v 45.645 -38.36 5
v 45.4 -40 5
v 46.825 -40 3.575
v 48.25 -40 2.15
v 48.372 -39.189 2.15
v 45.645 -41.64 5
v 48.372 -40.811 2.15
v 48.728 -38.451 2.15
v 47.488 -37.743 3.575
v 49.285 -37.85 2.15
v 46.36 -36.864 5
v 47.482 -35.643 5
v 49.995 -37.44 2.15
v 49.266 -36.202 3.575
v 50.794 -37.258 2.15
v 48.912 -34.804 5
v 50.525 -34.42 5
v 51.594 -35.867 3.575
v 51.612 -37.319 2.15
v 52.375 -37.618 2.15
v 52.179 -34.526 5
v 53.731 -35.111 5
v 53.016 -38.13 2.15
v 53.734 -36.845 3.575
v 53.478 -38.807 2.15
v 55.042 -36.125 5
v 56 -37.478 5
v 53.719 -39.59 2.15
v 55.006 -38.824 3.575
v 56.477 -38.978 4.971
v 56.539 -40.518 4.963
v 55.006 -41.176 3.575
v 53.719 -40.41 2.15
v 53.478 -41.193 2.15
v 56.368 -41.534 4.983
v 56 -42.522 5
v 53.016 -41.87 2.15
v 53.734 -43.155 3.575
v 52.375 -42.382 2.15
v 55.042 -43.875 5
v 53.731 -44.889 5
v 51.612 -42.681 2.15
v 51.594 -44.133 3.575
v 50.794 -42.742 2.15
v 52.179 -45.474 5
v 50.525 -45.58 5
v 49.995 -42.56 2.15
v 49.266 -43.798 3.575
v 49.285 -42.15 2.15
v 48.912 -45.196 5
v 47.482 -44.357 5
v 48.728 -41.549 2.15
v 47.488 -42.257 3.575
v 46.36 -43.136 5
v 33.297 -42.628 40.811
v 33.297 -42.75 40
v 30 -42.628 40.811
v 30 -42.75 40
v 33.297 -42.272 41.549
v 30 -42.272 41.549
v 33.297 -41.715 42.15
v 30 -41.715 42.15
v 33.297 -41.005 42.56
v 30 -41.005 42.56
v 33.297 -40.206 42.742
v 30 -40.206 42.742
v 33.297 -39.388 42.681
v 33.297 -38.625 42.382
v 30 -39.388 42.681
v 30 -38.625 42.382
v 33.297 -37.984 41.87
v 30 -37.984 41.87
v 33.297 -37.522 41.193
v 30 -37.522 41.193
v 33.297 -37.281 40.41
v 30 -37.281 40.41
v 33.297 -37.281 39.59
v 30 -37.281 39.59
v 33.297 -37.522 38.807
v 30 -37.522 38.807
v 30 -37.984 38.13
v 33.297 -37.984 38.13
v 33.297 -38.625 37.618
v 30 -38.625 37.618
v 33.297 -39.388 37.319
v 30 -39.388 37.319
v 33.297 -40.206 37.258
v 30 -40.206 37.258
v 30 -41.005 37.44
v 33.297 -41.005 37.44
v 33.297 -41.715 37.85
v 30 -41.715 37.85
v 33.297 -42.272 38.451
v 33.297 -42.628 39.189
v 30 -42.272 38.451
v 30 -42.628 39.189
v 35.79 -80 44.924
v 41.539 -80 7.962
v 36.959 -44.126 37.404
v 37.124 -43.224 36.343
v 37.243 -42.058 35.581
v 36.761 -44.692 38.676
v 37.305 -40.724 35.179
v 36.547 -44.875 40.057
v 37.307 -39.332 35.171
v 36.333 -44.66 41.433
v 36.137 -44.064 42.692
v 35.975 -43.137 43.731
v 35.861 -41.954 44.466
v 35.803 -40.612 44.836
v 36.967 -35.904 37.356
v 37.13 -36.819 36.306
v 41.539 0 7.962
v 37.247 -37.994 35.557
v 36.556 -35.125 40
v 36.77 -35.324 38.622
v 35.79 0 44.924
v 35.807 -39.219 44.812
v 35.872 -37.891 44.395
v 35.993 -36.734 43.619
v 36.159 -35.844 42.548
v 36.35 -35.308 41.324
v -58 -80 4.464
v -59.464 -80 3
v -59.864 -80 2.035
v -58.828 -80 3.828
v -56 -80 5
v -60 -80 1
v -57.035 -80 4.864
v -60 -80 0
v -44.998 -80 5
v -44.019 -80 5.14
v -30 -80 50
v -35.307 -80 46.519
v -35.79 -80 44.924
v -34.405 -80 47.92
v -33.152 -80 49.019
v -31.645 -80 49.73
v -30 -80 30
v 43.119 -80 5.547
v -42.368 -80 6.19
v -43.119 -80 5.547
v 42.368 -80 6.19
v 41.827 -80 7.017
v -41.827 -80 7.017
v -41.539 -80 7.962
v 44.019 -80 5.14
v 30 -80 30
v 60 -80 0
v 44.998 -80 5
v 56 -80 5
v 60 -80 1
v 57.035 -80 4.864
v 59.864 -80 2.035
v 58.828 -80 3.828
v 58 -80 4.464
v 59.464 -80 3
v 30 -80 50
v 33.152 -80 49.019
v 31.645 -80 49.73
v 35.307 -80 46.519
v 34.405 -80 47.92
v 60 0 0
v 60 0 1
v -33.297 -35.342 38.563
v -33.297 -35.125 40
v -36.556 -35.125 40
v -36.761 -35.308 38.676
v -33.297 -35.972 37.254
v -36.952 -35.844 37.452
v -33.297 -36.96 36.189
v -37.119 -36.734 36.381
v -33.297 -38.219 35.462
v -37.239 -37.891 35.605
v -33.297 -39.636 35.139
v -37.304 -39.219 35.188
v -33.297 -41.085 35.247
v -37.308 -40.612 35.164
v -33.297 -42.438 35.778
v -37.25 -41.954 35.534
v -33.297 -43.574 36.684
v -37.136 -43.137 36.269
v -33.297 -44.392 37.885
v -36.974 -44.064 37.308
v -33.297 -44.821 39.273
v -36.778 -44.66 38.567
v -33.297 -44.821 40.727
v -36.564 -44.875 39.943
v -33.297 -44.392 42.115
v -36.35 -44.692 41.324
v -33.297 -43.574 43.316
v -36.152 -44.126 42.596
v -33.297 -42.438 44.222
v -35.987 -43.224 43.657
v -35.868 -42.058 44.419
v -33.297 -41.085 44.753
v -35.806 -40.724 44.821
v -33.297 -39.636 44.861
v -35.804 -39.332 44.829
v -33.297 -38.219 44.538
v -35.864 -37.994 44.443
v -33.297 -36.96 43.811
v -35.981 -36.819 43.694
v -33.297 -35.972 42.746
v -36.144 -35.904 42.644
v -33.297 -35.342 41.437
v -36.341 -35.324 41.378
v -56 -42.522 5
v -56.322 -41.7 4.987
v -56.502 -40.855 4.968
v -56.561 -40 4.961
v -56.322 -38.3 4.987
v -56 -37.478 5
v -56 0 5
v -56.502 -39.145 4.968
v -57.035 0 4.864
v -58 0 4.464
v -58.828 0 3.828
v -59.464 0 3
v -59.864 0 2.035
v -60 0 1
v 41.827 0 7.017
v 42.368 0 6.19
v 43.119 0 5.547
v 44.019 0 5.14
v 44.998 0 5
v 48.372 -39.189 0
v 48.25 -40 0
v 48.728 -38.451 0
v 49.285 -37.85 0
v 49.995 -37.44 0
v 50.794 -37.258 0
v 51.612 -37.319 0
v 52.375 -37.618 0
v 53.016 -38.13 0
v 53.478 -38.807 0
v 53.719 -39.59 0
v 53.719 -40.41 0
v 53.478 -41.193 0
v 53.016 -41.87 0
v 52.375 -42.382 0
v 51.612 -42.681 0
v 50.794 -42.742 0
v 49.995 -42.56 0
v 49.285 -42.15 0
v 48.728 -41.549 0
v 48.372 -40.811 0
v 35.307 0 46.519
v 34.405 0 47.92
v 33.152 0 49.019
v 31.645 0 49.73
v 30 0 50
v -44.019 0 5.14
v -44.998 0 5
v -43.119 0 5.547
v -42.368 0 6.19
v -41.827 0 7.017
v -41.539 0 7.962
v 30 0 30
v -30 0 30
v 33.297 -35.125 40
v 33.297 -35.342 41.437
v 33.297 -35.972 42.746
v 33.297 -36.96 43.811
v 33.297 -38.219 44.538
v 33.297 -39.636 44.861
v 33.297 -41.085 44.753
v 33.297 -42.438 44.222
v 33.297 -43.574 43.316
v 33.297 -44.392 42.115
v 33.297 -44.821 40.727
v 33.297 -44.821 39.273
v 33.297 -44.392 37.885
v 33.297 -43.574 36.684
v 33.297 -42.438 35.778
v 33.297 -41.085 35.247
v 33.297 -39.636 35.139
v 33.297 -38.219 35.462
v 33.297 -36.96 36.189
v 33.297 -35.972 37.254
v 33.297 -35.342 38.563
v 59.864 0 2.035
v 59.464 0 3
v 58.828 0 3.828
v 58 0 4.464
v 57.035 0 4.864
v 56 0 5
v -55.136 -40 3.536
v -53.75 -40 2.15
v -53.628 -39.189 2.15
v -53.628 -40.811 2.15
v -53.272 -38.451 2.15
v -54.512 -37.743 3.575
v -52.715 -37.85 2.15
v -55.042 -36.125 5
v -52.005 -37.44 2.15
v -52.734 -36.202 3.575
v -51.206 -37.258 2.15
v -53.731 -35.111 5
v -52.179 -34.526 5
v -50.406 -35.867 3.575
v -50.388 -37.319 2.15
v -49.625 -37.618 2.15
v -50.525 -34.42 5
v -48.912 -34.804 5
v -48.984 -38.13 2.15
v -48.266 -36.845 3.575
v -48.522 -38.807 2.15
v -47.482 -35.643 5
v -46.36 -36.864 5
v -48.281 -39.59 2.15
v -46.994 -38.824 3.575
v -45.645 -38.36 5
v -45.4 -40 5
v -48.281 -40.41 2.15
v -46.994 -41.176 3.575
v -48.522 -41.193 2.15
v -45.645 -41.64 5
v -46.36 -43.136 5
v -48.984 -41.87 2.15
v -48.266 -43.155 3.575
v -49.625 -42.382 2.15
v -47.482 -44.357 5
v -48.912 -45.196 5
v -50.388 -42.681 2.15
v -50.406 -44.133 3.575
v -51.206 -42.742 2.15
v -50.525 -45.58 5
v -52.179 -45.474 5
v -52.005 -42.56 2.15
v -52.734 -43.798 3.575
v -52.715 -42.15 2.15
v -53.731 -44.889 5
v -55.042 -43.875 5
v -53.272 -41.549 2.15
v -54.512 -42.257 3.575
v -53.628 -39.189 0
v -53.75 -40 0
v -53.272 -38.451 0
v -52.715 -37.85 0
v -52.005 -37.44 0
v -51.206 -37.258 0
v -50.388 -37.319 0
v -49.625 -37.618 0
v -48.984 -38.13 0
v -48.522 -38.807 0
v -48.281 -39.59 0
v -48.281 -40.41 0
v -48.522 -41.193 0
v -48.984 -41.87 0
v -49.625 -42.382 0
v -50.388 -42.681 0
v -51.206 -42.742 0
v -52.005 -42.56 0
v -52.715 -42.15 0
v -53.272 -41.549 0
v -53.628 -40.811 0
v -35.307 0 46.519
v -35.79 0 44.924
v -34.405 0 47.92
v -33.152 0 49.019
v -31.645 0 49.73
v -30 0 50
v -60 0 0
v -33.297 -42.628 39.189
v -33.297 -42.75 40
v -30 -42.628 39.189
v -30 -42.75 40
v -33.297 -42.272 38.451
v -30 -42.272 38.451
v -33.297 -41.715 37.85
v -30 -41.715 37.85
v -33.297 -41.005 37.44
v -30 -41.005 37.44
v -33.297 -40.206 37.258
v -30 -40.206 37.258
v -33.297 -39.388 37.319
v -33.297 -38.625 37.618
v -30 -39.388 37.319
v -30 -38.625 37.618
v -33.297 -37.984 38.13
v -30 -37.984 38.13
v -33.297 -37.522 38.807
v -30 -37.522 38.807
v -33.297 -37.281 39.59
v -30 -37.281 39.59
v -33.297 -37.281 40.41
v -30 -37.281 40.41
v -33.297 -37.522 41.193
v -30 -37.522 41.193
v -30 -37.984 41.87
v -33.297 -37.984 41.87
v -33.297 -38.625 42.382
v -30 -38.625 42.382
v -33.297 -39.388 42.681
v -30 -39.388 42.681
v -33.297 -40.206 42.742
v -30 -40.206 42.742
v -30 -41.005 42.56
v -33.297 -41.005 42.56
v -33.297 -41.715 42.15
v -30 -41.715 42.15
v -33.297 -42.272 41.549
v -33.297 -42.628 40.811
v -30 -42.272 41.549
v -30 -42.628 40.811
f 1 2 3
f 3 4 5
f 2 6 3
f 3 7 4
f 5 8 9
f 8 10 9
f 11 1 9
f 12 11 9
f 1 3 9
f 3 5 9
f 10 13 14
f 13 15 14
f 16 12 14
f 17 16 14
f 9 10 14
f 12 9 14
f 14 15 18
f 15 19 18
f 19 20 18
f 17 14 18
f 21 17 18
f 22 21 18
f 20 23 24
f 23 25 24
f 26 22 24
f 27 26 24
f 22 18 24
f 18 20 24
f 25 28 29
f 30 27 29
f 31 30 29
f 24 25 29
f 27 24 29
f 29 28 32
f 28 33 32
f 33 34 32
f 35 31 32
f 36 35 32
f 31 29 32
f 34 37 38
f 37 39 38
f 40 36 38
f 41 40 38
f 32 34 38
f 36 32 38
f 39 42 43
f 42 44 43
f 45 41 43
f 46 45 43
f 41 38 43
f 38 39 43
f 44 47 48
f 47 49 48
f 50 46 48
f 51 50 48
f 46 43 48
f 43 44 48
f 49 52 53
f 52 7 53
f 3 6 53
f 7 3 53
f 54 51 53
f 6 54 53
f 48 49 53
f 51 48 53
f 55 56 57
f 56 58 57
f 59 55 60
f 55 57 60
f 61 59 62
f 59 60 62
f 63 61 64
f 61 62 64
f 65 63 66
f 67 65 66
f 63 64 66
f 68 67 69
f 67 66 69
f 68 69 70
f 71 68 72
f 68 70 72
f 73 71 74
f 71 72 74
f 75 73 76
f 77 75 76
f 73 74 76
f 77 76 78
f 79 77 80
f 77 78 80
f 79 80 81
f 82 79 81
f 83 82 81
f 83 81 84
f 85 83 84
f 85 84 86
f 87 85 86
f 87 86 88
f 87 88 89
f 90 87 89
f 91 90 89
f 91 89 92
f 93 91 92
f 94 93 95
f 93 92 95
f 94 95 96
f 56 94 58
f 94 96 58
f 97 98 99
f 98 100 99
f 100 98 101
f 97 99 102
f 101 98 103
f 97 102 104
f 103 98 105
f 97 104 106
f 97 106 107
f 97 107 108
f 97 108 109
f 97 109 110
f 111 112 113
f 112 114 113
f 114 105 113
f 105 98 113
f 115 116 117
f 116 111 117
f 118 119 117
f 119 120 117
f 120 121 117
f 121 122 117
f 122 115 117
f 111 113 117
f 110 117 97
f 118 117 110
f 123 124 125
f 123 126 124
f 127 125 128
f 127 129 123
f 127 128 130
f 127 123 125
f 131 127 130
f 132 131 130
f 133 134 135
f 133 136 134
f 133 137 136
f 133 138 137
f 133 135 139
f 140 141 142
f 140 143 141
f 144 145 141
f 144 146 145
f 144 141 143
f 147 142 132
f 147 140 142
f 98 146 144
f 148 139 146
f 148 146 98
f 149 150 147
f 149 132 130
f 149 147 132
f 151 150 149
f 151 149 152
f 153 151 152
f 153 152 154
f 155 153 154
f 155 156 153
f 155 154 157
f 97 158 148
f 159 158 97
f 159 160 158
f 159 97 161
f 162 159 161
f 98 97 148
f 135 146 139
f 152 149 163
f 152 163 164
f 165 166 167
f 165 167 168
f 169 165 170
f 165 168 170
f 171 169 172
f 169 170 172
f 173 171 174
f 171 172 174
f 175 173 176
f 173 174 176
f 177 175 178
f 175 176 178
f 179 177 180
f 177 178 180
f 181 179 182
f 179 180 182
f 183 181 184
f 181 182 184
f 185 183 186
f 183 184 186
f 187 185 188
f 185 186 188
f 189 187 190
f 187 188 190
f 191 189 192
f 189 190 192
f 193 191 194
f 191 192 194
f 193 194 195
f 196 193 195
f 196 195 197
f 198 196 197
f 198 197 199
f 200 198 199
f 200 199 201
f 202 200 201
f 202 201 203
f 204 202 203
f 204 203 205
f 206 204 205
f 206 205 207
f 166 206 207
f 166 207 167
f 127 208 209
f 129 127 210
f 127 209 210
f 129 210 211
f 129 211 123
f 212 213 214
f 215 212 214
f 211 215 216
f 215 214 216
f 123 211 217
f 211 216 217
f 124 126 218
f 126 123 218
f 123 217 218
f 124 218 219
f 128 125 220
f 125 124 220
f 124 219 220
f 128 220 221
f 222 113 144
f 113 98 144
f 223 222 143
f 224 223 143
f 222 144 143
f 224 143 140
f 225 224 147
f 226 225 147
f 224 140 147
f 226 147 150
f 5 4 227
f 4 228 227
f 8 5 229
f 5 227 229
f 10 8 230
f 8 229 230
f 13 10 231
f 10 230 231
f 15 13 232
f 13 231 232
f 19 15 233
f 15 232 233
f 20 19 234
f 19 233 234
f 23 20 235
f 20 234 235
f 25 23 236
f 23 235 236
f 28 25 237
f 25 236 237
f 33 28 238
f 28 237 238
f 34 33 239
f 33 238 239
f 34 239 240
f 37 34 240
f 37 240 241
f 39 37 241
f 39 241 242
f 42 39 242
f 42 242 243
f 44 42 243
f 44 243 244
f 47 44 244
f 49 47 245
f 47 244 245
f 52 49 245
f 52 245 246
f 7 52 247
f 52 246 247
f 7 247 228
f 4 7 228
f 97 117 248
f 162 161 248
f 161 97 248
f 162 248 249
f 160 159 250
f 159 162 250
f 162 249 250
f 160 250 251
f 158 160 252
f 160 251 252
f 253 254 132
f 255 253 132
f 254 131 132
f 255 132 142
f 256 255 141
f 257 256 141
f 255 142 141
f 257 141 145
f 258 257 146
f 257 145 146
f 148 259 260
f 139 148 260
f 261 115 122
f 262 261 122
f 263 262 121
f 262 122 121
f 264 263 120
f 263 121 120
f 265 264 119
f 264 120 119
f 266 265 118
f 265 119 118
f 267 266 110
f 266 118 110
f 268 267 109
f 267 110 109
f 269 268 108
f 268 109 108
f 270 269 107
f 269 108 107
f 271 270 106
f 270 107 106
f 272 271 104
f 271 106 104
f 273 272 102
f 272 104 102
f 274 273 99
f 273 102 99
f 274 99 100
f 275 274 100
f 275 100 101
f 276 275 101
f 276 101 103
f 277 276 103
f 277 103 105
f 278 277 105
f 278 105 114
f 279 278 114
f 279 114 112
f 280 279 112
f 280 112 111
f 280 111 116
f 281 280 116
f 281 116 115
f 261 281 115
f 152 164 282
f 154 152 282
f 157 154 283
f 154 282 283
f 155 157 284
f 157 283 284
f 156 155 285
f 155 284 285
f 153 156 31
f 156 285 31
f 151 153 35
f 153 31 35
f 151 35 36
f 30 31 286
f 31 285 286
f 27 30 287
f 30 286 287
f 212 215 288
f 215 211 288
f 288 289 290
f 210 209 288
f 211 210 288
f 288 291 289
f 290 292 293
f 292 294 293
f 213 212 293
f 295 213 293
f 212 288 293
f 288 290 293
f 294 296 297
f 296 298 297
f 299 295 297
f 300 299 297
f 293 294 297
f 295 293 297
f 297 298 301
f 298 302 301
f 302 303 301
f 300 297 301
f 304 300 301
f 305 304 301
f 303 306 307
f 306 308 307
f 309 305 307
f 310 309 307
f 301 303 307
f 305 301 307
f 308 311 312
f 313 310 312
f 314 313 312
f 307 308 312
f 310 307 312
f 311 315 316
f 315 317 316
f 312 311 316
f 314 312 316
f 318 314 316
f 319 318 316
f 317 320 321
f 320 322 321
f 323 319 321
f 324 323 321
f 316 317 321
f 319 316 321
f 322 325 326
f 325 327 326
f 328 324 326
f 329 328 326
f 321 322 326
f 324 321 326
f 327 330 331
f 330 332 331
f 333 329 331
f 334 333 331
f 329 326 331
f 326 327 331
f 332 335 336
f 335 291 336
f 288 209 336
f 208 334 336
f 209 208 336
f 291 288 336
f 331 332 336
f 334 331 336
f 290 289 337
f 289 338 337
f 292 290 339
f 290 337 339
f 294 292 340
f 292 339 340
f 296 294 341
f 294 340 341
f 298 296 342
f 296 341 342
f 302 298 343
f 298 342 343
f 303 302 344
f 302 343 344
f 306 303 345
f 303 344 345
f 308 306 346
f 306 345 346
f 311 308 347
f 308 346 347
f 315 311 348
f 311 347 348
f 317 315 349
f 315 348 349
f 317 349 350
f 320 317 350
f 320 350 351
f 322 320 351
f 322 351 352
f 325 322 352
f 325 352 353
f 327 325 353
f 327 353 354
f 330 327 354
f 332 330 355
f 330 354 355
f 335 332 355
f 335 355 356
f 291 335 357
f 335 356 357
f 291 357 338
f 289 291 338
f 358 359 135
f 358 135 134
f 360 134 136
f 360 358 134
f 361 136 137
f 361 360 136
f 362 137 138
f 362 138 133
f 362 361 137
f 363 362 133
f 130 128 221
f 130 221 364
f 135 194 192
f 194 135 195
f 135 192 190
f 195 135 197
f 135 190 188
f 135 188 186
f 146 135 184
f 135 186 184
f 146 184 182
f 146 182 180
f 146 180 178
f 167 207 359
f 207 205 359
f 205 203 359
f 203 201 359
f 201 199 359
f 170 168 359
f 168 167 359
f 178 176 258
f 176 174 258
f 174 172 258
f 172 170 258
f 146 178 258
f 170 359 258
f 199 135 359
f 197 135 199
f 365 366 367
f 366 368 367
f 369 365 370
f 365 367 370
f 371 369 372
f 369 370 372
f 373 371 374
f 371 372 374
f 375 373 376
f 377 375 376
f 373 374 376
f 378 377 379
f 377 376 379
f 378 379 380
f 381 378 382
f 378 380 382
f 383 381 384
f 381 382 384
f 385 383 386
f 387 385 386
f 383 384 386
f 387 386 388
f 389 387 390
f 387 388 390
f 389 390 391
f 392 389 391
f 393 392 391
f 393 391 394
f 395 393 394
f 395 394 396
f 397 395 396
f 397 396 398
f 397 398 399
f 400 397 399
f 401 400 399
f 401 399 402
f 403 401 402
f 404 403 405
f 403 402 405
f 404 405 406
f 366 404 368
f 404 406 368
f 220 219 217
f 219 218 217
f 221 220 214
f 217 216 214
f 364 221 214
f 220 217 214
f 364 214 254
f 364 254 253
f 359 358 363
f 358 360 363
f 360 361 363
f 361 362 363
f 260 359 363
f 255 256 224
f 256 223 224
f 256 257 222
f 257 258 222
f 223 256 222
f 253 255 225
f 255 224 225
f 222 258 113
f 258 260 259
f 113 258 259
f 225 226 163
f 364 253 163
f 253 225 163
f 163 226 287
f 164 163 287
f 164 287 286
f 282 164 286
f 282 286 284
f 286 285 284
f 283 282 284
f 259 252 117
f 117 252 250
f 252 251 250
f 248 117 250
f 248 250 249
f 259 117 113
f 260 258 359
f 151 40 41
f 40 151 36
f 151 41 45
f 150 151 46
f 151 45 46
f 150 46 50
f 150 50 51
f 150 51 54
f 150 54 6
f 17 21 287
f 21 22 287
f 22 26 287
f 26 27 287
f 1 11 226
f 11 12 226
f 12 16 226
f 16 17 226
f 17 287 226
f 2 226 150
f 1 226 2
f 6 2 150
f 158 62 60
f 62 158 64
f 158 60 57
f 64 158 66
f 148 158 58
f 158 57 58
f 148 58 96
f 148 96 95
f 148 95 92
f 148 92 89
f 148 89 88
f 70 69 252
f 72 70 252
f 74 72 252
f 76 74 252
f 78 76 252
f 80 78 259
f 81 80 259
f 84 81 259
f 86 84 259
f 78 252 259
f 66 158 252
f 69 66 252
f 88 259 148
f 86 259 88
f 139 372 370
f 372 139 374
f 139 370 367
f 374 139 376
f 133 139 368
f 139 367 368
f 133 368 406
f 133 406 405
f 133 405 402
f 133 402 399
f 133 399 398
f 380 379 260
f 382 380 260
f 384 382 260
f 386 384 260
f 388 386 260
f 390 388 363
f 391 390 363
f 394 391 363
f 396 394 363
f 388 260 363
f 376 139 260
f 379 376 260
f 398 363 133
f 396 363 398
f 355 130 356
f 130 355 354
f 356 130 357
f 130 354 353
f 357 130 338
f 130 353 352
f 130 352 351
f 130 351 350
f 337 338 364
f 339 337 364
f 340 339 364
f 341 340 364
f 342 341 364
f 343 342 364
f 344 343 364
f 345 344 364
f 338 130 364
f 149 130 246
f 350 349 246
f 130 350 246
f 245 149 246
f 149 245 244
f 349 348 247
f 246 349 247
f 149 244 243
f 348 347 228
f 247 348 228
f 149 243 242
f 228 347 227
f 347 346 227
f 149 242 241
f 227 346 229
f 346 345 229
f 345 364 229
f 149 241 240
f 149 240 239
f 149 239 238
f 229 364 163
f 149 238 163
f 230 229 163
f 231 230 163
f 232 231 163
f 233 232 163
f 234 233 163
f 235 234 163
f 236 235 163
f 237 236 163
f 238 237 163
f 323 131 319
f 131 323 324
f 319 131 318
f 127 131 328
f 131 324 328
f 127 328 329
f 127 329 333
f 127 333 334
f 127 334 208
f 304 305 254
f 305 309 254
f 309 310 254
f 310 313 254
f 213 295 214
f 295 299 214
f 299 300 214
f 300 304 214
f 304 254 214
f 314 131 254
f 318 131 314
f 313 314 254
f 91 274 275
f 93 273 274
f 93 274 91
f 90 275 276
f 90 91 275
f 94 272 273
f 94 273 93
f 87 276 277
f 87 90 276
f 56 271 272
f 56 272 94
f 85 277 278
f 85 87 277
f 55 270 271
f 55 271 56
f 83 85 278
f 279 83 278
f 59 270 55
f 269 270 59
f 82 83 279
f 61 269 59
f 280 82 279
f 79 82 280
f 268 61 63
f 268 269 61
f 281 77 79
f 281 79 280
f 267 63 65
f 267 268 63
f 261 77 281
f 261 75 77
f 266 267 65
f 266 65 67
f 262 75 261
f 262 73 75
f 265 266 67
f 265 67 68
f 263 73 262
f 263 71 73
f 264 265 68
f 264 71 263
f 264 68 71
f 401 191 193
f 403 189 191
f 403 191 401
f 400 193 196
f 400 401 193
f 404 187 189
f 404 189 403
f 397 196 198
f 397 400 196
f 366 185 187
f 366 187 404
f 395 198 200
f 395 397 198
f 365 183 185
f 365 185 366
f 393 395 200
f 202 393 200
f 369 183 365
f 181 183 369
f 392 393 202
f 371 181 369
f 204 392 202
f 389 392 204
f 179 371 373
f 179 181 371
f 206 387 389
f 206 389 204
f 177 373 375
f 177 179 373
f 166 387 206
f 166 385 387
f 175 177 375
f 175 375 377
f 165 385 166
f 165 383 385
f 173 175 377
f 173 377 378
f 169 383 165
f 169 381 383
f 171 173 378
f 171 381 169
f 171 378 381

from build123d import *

# Parameters (mm, degrees)
F1_DEPTH              = 80
F10_D                 = 5.5
F10_DEPTH             = 10
F10_CSINK_D           = 11.2
F10_CSINK_ANGLE       = 90
F10_TIP               = 1.6523667023
F10_ON_F3_D           = 5.5
F10_ON_F3_DEPTH       = 10
F10_ON_F3_CSINK_D     = 11.2
F10_ON_F3_CSINK_ANGLE = 90
F10_ON_F3_TIP         = 1.6523667023
F11_D                 = 5.5
F11_DEPTH             = 10
F11_START             = 2.7027778
F11_CBORE_D           = 9.75
F11_CBORE_DEPTH       = 2.5
F11_TIP               = 1.6523667023
F12_D                 = 5.5
F12_DEPTH             = 10
F12_START             = 2.7027778
F12_CBORE_D           = 9.75
F12_CBORE_DEPTH       = 2.5
F12_TIP               = 1.6523667023
F13_T1_DEPTH          = 105.6859695087
F14_R                 = 3.5
F15_T1_DEPTH          = 100


# Not quite as in the source:
# - a fillet or chamfer that OpenCascade refuses, or shapes differently, is made with other operations: its cross-section is extruded or revolved along the edge and cut away or added


with BuildPart() as f1:
    # F0 (on Front) → F1 (new body)
    with BuildSketch(Plane.XZ):
        Polygon((-60, 5), (-60, 0), (60, 0), (60, 5), (42, 5), (35, 50), (30, 50), (30, 30), (-30, 30), (-30, 50), (-35, 50), (-42, 5), align=None)
    extrude(amount=F1_DEPTH)

    # F10
    with Locations(Plane.XY.offset(5)):
        with Locations((-51, -40)):
            CounterSinkHole(F10_D / 2, F10_CSINK_D / 2, depth=F10_DEPTH, counter_sink_angle=F10_CSINK_ANGLE)
            with Locations((0, 0, -(F10_DEPTH + F10_TIP / 2))):  # 118° drill point
                Cone(0, F10_D / 2, F10_TIP, mode=Mode.SUBTRACT)

    # F10 on F3
    with Locations(Plane.XY.offset(5)):
        with Locations((51, -40)):
            CounterSinkHole(F10_ON_F3_D / 2, F10_ON_F3_CSINK_D / 2, depth=F10_ON_F3_DEPTH, counter_sink_angle=F10_ON_F3_CSINK_ANGLE)
            with Locations((0, 0, -(F10_ON_F3_DEPTH + F10_ON_F3_TIP / 2))):  # 118° drill point
                Cone(0, F10_ON_F3_D / 2, F10_ON_F3_TIP, mode=Mode.SUBTRACT)

    # F11
    # its depths count from where the whole tool has entered the part; down to there all is cleared
    with Locations(Plane(origin=(-38.5, 0, 0), x_dir=(0, 1, 0), z_dir=(-1, 0, 0)).offset(-F11_START)):
        with Locations((-40, -40)):
            CounterBoreHole(F11_D / 2, F11_CBORE_D / 2, F11_CBORE_DEPTH, depth=F11_DEPTH)
            with Locations((0, 0, -(F11_DEPTH + F11_TIP / 2))):  # 118° drill point
                Cone(0, F11_D / 2, F11_TIP, mode=Mode.SUBTRACT)

    # F12
    # its depths count from where the whole tool has entered the part; down to there all is cleared
    with Locations(Plane.YZ.offset(38.5).offset(-F12_START)):
        with Locations((-40, 40)):
            CounterBoreHole(F12_D / 2, F12_CBORE_D / 2, F12_CBORE_DEPTH, depth=F12_DEPTH)
            with Locations((0, 0, -(F12_DEPTH + F12_TIP / 2))):  # 118° drill point
                Cone(0, F12_D / 2, F12_TIP, mode=Mode.SUBTRACT)

    # F13: fillet of radius 6 on 2 edges, made by hand

    # F13_s2 → F13_t1 (cut)
    with BuildSketch(Plane.XZ.offset(-12.8429847543)):
        with BuildLine():
            ThreePointArc((-35.7896226953, 44.9238541015), (-33.8164627137, 48.513120963), (-30, 50))
            Line((-30, 50), (-35, 50))
            Line((-35, 50), (-35.7896226953, 44.9238541015))
        make_face()
        with BuildLine():
            ThreePointArc((35.7896226953, 44.9238541015), (33.8164627137, 48.513120963), (30, 50))
            Line((30, 50), (35, 50))
            Line((35, 50), (35.7896226953, 44.9238541015))
        make_face()
    extrude(amount=F13_T1_DEPTH, mode=Mode.SUBTRACT)

    # F14
    f14_edges = [f1.edges().sort_by_distance(p)[0] for p in [
        (-42, -40, 5),
        (42, -40, 5),
    ]]
    fillet(f14_edges, radius=F14_R)

    # F15: fillet of radius 4 on 2 edges, made by hand

    # F15_s2 → F15_t1 (cut)
    with BuildSketch(Plane.XZ.offset(-10)):
        with BuildLine():
            ThreePointArc((-56, 5), (-58.8284271247, 3.8284271247), (-60, 1))
            Line((-60, 1), (-60, 5))
            Line((-60, 5), (-56, 5))
        make_face()
        with BuildLine():
            ThreePointArc((60, 1), (58.8284271247, 3.8284271247), (56, 5))
            Line((56, 5), (60, 5))
            Line((60, 5), (60, 1))
        make_face()
    extrude(amount=F15_T1_DEPTH, mode=Mode.SUBTRACT)


solid = f1.part
